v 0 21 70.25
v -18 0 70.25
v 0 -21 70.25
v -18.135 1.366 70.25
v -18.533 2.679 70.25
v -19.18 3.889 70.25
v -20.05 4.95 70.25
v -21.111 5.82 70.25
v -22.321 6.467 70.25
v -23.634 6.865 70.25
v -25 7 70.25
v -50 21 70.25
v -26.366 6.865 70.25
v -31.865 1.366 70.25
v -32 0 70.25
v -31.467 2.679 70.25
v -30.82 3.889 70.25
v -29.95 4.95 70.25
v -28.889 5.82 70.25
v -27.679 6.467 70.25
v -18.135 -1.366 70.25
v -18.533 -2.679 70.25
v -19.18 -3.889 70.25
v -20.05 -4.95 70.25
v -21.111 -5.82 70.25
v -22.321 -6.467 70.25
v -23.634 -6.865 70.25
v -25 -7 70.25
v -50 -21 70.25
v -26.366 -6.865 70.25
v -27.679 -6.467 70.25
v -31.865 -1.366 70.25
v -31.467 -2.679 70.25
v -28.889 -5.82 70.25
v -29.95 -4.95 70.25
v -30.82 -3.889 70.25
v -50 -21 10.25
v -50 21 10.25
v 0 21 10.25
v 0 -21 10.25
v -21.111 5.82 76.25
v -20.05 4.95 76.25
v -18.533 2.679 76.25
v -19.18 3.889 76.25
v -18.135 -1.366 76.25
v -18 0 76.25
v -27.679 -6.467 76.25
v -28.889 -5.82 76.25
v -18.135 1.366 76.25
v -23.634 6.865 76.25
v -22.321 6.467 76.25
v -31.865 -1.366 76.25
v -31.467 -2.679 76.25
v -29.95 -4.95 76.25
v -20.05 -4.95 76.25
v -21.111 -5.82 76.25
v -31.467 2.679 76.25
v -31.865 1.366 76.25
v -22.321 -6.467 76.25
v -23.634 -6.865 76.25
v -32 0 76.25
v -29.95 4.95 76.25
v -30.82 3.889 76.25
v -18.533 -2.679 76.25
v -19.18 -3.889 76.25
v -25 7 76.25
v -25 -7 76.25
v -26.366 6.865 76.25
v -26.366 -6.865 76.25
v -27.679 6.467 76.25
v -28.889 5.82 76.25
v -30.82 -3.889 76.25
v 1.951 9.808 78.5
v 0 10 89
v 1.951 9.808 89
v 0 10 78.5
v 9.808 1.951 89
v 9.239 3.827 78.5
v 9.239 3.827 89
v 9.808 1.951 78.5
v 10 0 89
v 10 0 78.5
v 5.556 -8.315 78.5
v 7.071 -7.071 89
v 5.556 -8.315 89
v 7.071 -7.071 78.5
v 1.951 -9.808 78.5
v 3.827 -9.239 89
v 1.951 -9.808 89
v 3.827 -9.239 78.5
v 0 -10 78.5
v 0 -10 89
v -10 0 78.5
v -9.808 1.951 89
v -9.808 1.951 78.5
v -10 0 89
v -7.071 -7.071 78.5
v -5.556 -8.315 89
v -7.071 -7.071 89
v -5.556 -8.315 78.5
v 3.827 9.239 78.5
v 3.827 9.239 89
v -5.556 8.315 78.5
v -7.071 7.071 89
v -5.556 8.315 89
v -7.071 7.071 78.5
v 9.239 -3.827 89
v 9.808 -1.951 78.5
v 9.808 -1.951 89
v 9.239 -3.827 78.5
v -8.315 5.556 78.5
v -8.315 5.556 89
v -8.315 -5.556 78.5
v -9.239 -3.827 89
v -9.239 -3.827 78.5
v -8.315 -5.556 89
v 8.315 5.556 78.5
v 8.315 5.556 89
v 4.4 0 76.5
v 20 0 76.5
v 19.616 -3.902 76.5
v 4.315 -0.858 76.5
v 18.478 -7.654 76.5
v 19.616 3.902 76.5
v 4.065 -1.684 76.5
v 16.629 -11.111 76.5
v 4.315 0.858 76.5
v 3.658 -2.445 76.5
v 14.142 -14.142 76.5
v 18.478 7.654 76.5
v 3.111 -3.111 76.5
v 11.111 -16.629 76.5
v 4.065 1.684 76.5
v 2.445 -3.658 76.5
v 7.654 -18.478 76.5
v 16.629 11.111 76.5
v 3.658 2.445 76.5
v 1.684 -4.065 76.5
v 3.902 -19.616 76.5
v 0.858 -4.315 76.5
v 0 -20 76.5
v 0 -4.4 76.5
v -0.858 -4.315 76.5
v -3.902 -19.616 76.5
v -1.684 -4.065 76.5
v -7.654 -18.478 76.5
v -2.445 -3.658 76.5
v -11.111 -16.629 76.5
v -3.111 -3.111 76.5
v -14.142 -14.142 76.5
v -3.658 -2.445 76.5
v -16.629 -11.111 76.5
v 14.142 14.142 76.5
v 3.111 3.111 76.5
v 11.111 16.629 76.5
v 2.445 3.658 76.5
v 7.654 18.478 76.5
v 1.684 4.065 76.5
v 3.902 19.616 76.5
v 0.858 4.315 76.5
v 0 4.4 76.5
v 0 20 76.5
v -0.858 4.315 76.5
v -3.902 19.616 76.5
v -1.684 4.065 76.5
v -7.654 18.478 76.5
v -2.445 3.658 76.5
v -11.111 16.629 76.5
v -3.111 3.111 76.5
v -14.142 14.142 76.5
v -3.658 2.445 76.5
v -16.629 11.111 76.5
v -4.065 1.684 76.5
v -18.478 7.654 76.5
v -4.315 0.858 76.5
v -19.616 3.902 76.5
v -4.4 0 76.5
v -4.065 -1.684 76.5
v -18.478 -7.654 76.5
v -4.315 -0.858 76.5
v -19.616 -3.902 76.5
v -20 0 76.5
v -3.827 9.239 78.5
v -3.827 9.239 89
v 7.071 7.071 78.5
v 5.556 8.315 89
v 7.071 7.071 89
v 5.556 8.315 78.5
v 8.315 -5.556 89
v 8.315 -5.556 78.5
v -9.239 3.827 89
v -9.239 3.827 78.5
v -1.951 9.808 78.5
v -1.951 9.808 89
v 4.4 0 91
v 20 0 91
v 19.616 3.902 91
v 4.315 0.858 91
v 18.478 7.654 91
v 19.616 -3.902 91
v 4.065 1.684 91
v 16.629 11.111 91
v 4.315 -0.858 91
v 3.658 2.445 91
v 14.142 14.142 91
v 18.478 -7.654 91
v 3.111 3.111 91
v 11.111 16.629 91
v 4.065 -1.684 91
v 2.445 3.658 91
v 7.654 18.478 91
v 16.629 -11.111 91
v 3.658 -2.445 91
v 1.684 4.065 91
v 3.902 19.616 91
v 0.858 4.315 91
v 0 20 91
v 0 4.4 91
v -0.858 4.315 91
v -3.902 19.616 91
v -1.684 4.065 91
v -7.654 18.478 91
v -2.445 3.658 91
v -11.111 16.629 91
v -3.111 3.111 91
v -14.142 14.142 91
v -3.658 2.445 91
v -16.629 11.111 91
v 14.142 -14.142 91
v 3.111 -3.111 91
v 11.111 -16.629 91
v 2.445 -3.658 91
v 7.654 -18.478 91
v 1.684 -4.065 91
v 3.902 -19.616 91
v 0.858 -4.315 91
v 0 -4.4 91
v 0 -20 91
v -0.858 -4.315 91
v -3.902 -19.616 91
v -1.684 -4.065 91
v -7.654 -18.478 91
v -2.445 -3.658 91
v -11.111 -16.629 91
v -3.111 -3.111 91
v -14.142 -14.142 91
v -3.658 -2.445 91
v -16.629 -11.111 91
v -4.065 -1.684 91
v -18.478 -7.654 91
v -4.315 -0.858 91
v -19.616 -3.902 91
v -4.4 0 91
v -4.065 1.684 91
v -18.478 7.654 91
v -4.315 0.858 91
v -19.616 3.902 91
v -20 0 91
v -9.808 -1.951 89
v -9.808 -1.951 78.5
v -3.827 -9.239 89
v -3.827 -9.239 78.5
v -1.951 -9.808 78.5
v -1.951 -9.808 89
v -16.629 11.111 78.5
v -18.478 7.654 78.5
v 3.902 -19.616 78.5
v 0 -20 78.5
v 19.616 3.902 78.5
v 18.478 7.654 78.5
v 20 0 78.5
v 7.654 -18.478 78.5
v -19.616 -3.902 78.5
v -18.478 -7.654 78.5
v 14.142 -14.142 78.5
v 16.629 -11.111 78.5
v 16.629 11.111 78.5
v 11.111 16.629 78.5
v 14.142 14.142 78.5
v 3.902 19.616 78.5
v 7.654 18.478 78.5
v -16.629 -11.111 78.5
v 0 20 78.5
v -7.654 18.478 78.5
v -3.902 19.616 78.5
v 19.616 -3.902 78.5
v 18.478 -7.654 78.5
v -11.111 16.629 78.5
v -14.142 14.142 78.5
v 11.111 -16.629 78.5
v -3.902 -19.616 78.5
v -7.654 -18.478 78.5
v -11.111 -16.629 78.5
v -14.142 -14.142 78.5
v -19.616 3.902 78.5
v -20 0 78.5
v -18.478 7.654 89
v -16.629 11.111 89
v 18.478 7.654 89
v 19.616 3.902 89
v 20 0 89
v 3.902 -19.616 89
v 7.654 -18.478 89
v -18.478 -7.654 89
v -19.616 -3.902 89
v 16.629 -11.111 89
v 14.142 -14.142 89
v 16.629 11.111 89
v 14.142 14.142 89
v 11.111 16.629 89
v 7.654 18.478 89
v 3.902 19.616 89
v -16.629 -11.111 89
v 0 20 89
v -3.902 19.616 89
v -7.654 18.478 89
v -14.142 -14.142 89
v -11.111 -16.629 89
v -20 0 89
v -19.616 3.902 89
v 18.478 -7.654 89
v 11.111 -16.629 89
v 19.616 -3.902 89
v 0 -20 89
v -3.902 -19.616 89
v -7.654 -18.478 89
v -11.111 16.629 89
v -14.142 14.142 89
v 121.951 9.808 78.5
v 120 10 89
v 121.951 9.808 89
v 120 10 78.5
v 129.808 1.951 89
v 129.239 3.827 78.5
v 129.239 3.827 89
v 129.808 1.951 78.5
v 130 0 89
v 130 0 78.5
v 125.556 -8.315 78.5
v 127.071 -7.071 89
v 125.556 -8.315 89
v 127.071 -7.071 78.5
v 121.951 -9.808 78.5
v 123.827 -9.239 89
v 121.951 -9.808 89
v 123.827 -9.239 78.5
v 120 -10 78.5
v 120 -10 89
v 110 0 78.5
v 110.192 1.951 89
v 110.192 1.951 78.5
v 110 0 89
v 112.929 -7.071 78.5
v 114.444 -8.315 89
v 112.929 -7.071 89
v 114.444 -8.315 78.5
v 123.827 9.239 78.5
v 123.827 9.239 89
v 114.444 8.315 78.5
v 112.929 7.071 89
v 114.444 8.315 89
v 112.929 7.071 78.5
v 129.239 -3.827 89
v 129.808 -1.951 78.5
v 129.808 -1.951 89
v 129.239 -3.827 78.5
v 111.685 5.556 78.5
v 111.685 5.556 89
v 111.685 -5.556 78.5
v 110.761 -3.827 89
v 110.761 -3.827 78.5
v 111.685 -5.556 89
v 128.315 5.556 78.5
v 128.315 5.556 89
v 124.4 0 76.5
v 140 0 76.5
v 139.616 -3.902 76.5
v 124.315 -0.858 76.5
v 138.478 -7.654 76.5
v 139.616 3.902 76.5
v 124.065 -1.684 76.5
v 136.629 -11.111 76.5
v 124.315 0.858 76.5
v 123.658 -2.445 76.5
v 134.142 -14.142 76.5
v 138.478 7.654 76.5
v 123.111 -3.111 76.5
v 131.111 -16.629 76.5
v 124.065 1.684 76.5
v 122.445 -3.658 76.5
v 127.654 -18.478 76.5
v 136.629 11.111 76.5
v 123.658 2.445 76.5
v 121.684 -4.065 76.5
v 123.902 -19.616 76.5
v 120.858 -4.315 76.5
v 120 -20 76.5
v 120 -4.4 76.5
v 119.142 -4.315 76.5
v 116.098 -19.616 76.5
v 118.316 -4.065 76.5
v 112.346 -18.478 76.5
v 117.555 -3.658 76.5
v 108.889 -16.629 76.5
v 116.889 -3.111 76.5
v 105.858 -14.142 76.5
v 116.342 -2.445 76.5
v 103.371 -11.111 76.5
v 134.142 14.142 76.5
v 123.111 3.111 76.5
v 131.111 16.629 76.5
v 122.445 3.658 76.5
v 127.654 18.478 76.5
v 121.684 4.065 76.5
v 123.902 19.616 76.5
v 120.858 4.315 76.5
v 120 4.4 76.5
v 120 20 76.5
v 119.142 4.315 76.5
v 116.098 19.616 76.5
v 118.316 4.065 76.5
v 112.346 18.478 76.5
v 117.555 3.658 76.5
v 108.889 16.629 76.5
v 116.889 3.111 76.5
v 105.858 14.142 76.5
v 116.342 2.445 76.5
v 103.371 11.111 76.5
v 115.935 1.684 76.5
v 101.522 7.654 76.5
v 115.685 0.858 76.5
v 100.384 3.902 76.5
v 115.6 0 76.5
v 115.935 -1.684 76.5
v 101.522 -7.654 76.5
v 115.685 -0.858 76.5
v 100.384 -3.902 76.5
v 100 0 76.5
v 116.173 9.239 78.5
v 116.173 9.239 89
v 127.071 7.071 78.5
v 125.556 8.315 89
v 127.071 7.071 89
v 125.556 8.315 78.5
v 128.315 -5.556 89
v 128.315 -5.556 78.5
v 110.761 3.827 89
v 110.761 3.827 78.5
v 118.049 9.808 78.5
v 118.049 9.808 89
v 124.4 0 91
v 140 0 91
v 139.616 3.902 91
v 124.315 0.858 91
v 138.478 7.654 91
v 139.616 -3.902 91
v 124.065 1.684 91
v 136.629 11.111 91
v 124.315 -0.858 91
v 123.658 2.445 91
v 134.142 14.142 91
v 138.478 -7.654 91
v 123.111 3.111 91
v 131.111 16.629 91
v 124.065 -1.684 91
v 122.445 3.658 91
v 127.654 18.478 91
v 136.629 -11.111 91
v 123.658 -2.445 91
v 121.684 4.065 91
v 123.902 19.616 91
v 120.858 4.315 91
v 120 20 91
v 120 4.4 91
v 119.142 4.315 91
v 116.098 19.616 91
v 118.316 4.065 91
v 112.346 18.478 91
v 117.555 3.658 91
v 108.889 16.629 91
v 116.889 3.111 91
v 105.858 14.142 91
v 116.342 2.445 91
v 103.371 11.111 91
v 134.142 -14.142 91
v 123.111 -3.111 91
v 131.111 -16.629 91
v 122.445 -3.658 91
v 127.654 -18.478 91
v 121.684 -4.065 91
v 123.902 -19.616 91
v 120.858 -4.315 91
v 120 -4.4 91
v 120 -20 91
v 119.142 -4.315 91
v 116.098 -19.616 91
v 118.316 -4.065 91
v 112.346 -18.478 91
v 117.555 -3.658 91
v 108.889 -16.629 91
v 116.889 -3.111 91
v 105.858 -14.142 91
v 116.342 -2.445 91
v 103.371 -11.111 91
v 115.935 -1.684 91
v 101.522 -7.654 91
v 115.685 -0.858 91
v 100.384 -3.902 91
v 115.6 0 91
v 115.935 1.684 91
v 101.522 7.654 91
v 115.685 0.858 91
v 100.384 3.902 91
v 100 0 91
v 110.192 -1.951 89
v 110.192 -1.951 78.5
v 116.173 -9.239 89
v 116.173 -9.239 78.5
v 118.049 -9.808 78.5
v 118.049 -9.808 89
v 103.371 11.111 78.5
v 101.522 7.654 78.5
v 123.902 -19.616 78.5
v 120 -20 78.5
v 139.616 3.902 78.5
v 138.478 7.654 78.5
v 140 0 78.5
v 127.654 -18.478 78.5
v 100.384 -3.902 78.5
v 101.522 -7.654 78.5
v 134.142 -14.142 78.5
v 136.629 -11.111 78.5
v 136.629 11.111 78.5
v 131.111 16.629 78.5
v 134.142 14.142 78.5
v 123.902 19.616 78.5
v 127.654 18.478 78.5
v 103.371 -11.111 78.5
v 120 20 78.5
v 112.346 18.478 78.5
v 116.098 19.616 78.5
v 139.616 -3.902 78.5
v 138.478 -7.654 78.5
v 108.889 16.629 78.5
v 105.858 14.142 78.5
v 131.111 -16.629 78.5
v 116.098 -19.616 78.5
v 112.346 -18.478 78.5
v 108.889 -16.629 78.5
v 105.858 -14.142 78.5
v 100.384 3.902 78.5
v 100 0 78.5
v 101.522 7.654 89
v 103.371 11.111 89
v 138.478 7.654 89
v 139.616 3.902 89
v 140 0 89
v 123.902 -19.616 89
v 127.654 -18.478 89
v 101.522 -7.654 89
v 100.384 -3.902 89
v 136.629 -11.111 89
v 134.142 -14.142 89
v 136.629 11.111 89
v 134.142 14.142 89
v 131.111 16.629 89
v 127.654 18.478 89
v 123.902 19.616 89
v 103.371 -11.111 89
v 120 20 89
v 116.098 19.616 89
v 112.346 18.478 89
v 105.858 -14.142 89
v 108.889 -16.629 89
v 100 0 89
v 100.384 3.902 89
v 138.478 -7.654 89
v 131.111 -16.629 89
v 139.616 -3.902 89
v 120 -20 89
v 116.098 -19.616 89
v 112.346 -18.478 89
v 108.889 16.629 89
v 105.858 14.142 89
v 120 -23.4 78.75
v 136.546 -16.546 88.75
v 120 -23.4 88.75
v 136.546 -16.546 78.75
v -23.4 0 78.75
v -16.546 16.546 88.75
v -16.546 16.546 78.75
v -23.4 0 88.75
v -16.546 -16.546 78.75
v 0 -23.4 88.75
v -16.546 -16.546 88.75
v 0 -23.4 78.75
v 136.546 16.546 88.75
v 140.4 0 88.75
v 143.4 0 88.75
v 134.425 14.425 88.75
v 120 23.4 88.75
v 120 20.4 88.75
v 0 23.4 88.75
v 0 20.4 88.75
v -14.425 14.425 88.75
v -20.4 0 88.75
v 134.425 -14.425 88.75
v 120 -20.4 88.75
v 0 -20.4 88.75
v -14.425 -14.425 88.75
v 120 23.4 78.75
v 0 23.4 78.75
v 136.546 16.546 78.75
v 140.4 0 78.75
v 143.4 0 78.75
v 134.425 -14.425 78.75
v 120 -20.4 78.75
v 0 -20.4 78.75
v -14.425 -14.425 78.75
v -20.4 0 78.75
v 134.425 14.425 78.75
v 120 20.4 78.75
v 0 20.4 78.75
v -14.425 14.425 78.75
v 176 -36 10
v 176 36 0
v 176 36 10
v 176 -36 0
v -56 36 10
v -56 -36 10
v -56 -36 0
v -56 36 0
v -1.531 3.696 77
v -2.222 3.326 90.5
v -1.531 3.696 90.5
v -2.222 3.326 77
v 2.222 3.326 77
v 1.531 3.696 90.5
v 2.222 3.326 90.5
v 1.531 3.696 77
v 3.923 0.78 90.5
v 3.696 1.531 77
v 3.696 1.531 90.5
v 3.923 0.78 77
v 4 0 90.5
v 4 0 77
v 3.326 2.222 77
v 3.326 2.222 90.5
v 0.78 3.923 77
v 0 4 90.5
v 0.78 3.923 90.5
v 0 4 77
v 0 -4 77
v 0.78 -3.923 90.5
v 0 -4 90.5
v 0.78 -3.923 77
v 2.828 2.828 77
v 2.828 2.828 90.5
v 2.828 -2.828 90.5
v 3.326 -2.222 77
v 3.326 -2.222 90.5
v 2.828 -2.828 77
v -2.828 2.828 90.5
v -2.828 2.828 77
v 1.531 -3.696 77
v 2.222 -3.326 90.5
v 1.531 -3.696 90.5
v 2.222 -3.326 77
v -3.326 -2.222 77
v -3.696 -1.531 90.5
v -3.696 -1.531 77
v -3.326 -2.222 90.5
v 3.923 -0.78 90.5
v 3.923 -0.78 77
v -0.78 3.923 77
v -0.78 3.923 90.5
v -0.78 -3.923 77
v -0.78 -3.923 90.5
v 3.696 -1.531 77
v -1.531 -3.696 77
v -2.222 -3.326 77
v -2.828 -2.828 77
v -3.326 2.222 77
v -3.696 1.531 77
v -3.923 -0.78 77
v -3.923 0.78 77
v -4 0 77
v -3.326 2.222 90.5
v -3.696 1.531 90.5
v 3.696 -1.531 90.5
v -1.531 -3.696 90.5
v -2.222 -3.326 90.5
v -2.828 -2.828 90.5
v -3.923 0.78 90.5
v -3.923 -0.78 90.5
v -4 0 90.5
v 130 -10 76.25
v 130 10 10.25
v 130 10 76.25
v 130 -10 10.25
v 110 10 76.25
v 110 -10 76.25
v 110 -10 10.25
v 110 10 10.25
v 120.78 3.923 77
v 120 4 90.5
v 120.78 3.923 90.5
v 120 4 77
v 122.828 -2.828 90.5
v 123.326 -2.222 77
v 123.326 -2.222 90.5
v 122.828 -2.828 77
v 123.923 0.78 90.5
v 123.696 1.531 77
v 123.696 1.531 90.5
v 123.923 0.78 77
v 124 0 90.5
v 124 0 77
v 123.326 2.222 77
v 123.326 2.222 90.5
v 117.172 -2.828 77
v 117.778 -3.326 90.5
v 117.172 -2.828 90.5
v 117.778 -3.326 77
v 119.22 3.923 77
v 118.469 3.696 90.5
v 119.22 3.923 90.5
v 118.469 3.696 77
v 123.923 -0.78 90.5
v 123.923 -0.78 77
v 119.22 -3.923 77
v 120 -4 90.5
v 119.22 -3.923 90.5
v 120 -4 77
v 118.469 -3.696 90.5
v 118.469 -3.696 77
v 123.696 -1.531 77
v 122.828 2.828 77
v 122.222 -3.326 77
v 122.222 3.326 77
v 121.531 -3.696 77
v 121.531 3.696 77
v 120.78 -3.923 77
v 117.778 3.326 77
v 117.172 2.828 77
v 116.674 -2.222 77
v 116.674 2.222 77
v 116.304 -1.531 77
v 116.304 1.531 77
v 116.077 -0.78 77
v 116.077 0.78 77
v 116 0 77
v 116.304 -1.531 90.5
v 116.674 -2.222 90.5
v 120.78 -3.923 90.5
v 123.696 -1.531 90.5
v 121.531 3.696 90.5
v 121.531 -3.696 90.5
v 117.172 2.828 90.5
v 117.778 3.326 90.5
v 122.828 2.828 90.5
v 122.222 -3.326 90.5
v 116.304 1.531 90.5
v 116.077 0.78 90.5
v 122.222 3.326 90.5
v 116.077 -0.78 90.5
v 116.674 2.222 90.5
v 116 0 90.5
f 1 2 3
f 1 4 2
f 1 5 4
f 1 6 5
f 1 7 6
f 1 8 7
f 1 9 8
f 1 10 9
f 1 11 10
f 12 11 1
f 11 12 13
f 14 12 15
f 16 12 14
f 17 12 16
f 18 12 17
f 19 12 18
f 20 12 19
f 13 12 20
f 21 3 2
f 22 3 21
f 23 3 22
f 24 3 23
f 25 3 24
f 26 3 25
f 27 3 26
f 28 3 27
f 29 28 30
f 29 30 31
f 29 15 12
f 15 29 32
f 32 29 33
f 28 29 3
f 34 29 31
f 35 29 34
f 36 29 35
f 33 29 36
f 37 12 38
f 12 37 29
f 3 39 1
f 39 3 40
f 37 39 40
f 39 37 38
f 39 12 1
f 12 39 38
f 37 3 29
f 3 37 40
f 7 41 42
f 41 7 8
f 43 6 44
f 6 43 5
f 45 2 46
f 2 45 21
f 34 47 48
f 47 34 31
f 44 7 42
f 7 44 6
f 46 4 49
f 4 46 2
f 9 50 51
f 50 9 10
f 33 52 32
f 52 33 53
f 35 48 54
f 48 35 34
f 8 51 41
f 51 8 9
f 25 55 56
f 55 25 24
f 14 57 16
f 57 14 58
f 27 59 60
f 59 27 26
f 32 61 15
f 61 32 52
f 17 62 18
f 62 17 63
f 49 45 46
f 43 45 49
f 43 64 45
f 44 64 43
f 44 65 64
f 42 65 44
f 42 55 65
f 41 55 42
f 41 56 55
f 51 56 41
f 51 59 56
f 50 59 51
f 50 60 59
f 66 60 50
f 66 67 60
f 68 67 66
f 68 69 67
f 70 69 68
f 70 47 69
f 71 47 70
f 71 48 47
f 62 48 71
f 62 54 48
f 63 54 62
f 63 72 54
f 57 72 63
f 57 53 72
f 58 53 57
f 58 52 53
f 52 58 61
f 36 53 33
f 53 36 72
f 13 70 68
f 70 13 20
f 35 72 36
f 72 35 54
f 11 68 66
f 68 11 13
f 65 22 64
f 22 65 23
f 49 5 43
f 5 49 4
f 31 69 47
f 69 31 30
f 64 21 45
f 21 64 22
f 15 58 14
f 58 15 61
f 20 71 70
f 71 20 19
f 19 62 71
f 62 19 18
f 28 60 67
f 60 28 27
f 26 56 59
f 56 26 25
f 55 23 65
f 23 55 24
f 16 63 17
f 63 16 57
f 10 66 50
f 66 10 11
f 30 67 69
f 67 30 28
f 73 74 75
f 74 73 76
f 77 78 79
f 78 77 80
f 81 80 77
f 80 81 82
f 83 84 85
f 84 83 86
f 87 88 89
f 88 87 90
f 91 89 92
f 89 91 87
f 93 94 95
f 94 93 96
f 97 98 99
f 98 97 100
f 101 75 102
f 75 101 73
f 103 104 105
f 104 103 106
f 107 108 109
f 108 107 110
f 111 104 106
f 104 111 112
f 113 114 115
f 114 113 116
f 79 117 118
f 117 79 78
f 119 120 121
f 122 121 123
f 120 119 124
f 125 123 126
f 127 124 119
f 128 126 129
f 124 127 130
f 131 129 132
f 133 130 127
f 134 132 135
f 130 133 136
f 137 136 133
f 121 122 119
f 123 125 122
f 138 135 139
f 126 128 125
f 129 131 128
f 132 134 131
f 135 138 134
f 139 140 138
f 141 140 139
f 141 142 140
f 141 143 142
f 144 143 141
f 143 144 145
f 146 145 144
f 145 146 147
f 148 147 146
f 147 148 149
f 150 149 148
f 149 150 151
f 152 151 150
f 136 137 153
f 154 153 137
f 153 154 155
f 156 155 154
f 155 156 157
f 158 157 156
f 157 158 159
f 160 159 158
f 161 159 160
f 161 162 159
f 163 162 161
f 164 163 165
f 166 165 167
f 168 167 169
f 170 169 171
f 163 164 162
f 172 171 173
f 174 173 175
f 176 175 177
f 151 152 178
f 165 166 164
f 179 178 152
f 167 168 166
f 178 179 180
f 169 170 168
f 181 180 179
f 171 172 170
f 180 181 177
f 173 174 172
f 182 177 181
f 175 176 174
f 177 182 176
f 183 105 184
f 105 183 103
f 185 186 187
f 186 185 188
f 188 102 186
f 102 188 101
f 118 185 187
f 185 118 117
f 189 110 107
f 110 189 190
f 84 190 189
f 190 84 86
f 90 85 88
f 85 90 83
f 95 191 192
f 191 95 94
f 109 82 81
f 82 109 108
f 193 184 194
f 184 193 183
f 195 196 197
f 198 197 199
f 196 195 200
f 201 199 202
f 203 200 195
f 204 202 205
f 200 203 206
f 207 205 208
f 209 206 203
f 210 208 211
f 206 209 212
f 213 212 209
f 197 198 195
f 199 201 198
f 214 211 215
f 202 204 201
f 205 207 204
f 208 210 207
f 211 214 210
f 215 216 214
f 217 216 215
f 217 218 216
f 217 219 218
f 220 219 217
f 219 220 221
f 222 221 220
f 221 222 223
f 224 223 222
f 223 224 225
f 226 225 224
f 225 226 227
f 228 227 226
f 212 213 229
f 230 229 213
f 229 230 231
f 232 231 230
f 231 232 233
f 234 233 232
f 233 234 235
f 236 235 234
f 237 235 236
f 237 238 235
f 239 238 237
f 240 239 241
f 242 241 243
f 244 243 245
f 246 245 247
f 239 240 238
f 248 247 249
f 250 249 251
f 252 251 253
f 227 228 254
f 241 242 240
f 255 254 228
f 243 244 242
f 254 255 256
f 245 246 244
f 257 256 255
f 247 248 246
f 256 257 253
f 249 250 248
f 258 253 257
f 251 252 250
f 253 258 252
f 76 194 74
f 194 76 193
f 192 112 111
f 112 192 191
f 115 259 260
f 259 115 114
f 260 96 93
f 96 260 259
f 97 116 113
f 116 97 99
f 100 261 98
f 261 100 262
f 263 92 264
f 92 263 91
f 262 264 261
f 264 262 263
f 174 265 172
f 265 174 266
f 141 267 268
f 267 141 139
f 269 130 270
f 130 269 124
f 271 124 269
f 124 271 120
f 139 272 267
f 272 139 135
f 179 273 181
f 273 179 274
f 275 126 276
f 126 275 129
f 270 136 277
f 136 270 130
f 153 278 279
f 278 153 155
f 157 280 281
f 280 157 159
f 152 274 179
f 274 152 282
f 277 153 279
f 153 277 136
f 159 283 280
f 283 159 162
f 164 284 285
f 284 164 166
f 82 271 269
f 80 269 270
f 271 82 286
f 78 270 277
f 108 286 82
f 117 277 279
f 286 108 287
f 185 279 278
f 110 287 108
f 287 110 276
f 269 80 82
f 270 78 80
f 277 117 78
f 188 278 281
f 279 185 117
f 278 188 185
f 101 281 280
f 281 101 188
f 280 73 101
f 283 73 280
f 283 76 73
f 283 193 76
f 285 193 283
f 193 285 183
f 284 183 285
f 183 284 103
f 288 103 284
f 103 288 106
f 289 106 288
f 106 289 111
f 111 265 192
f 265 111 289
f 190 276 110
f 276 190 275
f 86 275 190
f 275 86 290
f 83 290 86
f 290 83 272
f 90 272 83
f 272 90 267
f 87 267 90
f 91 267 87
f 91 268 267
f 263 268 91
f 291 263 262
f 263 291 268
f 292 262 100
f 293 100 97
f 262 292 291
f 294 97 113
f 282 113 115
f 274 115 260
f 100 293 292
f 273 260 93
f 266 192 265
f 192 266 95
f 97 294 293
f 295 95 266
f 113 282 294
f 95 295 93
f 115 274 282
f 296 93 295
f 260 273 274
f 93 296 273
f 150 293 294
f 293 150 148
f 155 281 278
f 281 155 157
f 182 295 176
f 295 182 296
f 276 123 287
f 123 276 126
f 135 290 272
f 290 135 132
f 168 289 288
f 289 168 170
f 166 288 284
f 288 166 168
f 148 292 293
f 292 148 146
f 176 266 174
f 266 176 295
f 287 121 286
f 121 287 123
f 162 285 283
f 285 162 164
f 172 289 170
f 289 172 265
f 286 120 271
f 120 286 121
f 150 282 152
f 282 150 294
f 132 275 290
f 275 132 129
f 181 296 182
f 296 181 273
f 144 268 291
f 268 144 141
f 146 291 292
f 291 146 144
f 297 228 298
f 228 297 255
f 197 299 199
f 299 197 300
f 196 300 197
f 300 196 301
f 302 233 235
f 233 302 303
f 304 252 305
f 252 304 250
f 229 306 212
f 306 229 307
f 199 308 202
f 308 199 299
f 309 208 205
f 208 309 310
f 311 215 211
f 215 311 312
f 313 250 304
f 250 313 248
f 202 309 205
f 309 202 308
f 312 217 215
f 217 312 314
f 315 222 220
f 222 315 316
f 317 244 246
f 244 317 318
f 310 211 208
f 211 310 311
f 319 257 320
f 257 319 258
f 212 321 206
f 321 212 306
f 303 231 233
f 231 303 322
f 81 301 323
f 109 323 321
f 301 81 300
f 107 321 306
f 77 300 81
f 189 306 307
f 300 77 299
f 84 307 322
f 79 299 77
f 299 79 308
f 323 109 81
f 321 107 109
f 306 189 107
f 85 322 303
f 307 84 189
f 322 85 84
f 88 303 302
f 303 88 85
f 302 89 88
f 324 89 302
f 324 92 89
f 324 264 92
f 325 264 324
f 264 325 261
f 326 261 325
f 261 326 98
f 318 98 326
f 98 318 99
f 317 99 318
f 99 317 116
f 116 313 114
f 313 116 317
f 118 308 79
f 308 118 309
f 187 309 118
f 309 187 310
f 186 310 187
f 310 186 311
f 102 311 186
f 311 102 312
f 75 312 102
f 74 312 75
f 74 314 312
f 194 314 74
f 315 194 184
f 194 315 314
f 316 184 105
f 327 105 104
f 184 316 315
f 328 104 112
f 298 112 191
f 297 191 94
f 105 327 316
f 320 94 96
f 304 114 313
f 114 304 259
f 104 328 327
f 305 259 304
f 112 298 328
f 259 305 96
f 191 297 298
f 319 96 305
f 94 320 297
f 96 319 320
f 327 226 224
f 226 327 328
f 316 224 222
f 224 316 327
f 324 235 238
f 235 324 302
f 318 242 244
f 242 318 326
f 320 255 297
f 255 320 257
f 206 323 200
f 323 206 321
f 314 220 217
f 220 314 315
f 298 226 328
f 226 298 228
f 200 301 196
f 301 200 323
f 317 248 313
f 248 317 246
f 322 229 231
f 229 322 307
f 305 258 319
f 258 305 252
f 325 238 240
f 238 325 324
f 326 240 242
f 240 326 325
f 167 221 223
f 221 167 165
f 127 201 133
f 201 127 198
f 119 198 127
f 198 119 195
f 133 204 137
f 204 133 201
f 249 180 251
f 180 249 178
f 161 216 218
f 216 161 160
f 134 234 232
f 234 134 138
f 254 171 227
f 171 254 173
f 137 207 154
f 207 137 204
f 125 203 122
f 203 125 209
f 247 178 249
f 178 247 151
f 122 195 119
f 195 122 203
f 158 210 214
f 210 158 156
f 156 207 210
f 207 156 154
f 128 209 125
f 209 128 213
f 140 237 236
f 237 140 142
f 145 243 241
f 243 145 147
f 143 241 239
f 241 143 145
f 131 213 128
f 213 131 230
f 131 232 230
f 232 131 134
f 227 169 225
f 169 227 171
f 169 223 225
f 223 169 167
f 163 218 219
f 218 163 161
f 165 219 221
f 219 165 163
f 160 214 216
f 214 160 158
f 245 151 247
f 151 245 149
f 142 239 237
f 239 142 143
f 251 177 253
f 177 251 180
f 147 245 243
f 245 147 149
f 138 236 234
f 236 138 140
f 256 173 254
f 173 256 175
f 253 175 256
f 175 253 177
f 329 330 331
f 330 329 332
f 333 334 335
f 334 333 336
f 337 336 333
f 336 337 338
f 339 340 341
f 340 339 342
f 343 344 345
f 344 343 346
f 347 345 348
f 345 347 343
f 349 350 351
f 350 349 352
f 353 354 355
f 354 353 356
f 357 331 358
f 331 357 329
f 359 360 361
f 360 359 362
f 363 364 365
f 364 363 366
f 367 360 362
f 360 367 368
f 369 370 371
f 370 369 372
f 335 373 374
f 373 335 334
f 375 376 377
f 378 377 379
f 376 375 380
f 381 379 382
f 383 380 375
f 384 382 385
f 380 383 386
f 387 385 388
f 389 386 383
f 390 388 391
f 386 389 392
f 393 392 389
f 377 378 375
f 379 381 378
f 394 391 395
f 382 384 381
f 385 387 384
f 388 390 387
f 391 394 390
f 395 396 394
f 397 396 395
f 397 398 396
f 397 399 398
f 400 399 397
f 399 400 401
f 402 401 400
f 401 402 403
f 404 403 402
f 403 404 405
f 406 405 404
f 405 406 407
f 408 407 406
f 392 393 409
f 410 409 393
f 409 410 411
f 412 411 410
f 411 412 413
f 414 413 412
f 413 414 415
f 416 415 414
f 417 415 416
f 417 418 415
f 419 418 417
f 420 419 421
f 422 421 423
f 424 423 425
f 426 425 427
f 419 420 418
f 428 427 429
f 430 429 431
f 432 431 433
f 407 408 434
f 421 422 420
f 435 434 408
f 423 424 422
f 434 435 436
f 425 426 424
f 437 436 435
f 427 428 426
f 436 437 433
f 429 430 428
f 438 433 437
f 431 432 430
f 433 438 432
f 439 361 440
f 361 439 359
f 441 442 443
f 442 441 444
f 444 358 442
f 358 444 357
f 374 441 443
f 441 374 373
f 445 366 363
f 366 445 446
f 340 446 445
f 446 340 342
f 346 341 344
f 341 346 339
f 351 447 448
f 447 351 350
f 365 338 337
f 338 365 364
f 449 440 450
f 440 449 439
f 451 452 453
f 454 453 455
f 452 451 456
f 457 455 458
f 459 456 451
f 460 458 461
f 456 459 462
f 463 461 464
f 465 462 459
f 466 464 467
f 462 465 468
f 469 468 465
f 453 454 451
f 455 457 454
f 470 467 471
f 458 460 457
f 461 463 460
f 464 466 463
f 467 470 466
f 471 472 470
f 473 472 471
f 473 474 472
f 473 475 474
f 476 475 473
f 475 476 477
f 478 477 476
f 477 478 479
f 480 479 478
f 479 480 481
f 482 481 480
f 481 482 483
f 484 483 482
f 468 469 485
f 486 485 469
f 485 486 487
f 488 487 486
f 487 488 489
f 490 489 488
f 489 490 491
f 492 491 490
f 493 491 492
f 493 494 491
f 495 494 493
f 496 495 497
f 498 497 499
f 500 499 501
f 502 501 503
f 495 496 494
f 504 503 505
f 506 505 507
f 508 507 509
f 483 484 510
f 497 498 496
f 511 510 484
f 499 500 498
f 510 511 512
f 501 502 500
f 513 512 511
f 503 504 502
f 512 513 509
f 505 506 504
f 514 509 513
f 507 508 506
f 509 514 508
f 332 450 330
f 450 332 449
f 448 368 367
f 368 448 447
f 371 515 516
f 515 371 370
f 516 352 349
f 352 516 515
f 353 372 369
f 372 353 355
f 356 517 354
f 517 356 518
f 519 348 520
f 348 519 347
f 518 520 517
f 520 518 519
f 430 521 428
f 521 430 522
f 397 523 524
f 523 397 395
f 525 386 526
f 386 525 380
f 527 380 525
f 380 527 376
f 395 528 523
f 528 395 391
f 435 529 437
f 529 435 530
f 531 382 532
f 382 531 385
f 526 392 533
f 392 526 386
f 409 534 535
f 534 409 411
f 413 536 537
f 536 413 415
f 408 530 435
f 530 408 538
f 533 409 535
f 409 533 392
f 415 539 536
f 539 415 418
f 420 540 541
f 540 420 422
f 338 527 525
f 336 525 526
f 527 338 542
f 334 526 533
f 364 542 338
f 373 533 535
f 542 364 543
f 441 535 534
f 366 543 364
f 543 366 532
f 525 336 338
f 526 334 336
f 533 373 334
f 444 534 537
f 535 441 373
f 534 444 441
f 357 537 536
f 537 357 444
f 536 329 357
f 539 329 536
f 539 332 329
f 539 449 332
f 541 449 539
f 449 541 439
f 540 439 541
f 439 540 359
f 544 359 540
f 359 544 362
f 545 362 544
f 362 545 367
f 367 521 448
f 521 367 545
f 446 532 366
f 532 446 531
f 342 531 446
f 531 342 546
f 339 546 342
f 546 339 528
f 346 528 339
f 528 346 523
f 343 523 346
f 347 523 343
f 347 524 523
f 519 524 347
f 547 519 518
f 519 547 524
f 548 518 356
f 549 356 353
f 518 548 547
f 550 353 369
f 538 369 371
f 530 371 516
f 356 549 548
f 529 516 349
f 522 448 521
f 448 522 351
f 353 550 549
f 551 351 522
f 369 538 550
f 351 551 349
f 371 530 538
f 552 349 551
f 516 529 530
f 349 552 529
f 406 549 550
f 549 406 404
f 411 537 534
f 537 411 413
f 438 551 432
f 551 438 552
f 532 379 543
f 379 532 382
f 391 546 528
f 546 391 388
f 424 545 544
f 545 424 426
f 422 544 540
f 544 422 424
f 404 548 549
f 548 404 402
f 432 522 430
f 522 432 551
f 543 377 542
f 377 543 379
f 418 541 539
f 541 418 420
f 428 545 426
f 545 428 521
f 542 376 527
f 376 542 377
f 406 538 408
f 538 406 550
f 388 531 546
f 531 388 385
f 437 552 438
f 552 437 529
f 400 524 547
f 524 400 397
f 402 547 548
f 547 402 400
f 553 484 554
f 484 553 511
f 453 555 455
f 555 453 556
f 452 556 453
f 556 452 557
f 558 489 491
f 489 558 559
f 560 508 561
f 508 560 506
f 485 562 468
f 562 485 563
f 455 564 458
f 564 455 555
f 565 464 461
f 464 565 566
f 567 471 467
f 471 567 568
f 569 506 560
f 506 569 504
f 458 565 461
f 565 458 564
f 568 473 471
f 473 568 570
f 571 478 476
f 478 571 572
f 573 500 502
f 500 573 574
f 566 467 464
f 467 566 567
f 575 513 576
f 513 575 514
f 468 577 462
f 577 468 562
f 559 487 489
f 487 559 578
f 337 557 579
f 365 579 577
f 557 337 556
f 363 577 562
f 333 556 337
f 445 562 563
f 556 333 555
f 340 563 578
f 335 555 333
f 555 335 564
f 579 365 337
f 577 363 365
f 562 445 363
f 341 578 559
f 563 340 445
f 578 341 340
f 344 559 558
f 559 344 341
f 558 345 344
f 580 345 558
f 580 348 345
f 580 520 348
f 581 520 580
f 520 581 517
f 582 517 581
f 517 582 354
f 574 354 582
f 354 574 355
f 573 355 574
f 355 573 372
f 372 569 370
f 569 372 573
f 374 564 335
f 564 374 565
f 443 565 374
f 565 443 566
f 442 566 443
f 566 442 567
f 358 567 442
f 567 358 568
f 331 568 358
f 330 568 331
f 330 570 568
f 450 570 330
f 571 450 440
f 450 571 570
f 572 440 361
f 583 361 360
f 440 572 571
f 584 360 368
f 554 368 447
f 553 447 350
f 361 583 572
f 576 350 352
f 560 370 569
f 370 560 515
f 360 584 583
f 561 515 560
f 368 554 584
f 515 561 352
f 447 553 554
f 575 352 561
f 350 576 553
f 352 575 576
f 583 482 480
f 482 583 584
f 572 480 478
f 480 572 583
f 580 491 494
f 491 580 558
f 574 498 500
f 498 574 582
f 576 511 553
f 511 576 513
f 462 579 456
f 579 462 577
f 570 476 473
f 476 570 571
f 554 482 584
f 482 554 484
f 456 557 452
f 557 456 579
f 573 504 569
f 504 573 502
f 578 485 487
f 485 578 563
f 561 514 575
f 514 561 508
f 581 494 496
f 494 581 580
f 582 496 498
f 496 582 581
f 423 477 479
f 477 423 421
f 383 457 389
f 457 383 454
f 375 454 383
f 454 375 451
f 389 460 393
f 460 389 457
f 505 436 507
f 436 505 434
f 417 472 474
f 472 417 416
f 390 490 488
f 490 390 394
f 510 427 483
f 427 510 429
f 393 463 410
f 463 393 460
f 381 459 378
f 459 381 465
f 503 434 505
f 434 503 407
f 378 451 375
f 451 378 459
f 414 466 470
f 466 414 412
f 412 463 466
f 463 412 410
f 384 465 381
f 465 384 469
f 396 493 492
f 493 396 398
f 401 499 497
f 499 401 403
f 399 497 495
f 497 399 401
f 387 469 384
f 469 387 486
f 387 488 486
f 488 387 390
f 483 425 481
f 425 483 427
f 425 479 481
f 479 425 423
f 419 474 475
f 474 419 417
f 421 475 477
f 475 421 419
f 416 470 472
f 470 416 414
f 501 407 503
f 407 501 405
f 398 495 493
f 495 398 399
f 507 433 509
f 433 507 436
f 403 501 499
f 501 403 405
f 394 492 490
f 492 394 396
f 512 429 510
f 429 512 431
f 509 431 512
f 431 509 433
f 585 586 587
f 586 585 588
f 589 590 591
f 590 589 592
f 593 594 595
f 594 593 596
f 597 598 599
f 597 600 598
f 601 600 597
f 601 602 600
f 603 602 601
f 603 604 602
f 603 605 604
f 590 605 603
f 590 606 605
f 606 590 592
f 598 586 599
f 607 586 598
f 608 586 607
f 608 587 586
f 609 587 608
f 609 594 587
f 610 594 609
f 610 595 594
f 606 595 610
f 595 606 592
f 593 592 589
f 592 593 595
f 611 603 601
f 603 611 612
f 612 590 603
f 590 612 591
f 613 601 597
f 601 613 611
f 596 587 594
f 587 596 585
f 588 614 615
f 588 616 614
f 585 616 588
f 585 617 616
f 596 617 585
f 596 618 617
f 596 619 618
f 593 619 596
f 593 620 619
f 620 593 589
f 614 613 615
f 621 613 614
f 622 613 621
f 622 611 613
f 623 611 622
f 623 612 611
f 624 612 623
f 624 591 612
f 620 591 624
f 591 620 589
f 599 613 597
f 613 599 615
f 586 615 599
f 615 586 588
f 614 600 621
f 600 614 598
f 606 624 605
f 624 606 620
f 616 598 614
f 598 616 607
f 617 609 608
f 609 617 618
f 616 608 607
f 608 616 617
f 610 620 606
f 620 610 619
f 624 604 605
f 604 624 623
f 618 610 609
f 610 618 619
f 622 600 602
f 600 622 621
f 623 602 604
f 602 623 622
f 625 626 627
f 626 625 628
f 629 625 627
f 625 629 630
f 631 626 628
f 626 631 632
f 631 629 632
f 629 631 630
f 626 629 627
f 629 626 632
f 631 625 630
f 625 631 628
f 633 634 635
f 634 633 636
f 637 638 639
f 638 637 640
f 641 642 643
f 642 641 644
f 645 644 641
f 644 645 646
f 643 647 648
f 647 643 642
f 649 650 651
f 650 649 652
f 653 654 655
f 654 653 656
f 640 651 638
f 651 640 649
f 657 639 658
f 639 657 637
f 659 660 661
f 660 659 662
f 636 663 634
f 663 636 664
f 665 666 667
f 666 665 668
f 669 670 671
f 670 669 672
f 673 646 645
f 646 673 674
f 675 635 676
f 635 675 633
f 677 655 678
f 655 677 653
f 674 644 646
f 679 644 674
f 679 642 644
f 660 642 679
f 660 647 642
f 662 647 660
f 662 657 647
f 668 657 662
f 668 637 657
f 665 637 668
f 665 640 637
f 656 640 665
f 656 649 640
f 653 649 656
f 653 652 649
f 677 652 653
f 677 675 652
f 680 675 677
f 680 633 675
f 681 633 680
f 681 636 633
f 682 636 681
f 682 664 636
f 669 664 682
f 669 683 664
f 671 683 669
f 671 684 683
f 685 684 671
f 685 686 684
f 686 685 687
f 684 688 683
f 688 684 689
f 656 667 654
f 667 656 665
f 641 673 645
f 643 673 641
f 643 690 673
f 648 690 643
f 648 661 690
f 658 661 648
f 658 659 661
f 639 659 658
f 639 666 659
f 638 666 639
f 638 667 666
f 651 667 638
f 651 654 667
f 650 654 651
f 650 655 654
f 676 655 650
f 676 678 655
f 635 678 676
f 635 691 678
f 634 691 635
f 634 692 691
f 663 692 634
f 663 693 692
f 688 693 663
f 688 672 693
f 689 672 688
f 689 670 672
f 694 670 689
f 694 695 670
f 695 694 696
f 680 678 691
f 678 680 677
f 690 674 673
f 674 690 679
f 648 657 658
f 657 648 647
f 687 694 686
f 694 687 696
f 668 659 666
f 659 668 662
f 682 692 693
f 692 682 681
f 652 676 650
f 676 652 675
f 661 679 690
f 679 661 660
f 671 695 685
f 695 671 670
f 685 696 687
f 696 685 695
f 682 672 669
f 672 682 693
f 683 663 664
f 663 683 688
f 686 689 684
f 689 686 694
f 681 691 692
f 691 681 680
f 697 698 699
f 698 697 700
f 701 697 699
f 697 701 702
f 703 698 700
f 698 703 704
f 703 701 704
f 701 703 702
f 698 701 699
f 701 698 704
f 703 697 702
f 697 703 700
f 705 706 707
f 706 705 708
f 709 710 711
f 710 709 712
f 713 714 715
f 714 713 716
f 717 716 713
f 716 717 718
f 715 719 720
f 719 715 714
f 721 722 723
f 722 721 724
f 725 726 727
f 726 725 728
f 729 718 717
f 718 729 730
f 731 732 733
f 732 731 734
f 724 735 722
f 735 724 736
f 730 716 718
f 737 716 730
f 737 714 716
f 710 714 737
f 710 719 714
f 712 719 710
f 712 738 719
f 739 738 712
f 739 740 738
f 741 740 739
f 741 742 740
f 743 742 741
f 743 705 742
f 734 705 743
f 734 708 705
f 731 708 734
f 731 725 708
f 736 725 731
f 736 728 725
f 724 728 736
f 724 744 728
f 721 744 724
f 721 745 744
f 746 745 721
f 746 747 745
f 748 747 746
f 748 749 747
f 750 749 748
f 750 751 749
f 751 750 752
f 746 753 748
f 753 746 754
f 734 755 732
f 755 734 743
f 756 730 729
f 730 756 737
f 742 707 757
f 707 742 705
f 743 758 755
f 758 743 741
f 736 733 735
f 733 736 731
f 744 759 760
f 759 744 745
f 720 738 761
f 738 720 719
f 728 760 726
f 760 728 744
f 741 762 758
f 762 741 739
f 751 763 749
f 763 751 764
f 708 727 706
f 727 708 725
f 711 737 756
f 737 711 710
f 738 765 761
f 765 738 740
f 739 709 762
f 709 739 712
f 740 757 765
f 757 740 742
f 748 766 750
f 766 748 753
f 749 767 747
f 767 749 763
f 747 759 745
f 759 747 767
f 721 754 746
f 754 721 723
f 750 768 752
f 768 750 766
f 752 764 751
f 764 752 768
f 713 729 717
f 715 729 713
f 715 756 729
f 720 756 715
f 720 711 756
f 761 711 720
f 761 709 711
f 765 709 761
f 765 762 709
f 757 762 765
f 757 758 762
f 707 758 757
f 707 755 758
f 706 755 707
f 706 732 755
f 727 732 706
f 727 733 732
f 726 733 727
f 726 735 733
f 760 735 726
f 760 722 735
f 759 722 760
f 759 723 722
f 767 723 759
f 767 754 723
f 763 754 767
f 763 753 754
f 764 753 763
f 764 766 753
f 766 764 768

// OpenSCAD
$fn = 32;

// ------------------------------------------------------------------------
// Motor belt drive: span 120 mm, pulleys d40, belt 10 mm wide
// Every part is its own module, assembly() places every instance.
// ------------------------------------------------------------------------

// --- part 1 ---
module base_plate() {
  difference() {
    translate([-116, -36, 0]) cube([232, 72, 10]);
  }
}

// --- part 2 ---
module motor() {
  union() {
    translate([-30, -21, 0]) cube([60, 42, 50]);
    translate([33, 0, 25]) rotate([0, 90, 0]) cylinder(h = 6, d = 14, center = true);
  }
}

// --- part 3 ---
module drive_shaft() {
  translate([0, 0, -6.75]) cylinder(h = 13.5, d = 8);
}

// --- part 4 ---
module pulley_drive() {
  difference() {
    union() {
      cylinder(h = 14.5, d = 20);
      cylinder(h = 2, d = 40);
      translate([0, 0, 12.5]) cylinder(h = 2, d = 40);
    }
    translate([0, 0, -1]) cylinder(h = 16.5, d = 8.8);
  }
}

// --- part 5 ---
module idler_post() {
  translate([-10, -10, 0]) cube([20, 20, 66]);
}

// --- part 6 ---
module driven_shaft() {
  translate([0, 0, -6.75]) cylinder(h = 13.5, d = 8);
}

// --- part 7 ---
module pulley_driven() {
  difference() {
    union() {
      cylinder(h = 14.5, d = 20);
      cylinder(h = 2, d = 40);
      translate([0, 0, 12.5]) cylinder(h = 2, d = 40);
    }
    translate([0, 0, -1]) cylinder(h = 16.5, d = 8.8);
  }
}

// --- part 8 ---
module drive_belt() {
  difference() {
    linear_extrude(height = 10) polygon(points = concat([for (a = [90 : 45 : 270]) [23.4 * cos(a), 23.4 * sin(a)]], [for (a = [270 : 45 : 450]) [120 + 23.4 * cos(a), 23.4 * sin(a)]]));
    translate([0, 0, -1]) linear_extrude(height = 12) polygon(points = concat([for (a = [90 : 45 : 270]) [20.4 * cos(a), 20.4 * sin(a)]], [for (a = [270 : 45 : 450]) [120 + 20.4 * cos(a), 20.4 * sin(a)]]));
  }
}

// --- assembly ---
module assembly() {
  color([0.80, 0.24, 0.20]) translate([60, 0, 0]) rotate([0, 0, 0]) base_plate();
  color([0.20, 0.45, 0.75]) translate([0, 0, 40.25]) rotate([0, 270, 0]) motor();
  color([0.25, 0.62, 0.32]) translate([0, 0, 83.75]) rotate([0, 0, 0]) drive_shaft();
  color([0.92, 0.70, 0.18]) translate([0, 0, 76.5]) rotate([0, 0, 0]) pulley_drive();
  color([0.58, 0.35, 0.70]) translate([120, 0, 10.25]) rotate([0, 0, 0]) idler_post();
  color([0.16, 0.66, 0.66]) translate([120, 0, 83.75]) rotate([0, 0, 0]) driven_shaft();
  color([0.85, 0.48, 0.18]) translate([120, 0, 76.5]) rotate([0, 0, 0]) pulley_driven();
  color([0.55, 0.60, 0.65]) translate([0, 0, 78.75]) rotate([0, 0, 0]) drive_belt();
}

assembly();
